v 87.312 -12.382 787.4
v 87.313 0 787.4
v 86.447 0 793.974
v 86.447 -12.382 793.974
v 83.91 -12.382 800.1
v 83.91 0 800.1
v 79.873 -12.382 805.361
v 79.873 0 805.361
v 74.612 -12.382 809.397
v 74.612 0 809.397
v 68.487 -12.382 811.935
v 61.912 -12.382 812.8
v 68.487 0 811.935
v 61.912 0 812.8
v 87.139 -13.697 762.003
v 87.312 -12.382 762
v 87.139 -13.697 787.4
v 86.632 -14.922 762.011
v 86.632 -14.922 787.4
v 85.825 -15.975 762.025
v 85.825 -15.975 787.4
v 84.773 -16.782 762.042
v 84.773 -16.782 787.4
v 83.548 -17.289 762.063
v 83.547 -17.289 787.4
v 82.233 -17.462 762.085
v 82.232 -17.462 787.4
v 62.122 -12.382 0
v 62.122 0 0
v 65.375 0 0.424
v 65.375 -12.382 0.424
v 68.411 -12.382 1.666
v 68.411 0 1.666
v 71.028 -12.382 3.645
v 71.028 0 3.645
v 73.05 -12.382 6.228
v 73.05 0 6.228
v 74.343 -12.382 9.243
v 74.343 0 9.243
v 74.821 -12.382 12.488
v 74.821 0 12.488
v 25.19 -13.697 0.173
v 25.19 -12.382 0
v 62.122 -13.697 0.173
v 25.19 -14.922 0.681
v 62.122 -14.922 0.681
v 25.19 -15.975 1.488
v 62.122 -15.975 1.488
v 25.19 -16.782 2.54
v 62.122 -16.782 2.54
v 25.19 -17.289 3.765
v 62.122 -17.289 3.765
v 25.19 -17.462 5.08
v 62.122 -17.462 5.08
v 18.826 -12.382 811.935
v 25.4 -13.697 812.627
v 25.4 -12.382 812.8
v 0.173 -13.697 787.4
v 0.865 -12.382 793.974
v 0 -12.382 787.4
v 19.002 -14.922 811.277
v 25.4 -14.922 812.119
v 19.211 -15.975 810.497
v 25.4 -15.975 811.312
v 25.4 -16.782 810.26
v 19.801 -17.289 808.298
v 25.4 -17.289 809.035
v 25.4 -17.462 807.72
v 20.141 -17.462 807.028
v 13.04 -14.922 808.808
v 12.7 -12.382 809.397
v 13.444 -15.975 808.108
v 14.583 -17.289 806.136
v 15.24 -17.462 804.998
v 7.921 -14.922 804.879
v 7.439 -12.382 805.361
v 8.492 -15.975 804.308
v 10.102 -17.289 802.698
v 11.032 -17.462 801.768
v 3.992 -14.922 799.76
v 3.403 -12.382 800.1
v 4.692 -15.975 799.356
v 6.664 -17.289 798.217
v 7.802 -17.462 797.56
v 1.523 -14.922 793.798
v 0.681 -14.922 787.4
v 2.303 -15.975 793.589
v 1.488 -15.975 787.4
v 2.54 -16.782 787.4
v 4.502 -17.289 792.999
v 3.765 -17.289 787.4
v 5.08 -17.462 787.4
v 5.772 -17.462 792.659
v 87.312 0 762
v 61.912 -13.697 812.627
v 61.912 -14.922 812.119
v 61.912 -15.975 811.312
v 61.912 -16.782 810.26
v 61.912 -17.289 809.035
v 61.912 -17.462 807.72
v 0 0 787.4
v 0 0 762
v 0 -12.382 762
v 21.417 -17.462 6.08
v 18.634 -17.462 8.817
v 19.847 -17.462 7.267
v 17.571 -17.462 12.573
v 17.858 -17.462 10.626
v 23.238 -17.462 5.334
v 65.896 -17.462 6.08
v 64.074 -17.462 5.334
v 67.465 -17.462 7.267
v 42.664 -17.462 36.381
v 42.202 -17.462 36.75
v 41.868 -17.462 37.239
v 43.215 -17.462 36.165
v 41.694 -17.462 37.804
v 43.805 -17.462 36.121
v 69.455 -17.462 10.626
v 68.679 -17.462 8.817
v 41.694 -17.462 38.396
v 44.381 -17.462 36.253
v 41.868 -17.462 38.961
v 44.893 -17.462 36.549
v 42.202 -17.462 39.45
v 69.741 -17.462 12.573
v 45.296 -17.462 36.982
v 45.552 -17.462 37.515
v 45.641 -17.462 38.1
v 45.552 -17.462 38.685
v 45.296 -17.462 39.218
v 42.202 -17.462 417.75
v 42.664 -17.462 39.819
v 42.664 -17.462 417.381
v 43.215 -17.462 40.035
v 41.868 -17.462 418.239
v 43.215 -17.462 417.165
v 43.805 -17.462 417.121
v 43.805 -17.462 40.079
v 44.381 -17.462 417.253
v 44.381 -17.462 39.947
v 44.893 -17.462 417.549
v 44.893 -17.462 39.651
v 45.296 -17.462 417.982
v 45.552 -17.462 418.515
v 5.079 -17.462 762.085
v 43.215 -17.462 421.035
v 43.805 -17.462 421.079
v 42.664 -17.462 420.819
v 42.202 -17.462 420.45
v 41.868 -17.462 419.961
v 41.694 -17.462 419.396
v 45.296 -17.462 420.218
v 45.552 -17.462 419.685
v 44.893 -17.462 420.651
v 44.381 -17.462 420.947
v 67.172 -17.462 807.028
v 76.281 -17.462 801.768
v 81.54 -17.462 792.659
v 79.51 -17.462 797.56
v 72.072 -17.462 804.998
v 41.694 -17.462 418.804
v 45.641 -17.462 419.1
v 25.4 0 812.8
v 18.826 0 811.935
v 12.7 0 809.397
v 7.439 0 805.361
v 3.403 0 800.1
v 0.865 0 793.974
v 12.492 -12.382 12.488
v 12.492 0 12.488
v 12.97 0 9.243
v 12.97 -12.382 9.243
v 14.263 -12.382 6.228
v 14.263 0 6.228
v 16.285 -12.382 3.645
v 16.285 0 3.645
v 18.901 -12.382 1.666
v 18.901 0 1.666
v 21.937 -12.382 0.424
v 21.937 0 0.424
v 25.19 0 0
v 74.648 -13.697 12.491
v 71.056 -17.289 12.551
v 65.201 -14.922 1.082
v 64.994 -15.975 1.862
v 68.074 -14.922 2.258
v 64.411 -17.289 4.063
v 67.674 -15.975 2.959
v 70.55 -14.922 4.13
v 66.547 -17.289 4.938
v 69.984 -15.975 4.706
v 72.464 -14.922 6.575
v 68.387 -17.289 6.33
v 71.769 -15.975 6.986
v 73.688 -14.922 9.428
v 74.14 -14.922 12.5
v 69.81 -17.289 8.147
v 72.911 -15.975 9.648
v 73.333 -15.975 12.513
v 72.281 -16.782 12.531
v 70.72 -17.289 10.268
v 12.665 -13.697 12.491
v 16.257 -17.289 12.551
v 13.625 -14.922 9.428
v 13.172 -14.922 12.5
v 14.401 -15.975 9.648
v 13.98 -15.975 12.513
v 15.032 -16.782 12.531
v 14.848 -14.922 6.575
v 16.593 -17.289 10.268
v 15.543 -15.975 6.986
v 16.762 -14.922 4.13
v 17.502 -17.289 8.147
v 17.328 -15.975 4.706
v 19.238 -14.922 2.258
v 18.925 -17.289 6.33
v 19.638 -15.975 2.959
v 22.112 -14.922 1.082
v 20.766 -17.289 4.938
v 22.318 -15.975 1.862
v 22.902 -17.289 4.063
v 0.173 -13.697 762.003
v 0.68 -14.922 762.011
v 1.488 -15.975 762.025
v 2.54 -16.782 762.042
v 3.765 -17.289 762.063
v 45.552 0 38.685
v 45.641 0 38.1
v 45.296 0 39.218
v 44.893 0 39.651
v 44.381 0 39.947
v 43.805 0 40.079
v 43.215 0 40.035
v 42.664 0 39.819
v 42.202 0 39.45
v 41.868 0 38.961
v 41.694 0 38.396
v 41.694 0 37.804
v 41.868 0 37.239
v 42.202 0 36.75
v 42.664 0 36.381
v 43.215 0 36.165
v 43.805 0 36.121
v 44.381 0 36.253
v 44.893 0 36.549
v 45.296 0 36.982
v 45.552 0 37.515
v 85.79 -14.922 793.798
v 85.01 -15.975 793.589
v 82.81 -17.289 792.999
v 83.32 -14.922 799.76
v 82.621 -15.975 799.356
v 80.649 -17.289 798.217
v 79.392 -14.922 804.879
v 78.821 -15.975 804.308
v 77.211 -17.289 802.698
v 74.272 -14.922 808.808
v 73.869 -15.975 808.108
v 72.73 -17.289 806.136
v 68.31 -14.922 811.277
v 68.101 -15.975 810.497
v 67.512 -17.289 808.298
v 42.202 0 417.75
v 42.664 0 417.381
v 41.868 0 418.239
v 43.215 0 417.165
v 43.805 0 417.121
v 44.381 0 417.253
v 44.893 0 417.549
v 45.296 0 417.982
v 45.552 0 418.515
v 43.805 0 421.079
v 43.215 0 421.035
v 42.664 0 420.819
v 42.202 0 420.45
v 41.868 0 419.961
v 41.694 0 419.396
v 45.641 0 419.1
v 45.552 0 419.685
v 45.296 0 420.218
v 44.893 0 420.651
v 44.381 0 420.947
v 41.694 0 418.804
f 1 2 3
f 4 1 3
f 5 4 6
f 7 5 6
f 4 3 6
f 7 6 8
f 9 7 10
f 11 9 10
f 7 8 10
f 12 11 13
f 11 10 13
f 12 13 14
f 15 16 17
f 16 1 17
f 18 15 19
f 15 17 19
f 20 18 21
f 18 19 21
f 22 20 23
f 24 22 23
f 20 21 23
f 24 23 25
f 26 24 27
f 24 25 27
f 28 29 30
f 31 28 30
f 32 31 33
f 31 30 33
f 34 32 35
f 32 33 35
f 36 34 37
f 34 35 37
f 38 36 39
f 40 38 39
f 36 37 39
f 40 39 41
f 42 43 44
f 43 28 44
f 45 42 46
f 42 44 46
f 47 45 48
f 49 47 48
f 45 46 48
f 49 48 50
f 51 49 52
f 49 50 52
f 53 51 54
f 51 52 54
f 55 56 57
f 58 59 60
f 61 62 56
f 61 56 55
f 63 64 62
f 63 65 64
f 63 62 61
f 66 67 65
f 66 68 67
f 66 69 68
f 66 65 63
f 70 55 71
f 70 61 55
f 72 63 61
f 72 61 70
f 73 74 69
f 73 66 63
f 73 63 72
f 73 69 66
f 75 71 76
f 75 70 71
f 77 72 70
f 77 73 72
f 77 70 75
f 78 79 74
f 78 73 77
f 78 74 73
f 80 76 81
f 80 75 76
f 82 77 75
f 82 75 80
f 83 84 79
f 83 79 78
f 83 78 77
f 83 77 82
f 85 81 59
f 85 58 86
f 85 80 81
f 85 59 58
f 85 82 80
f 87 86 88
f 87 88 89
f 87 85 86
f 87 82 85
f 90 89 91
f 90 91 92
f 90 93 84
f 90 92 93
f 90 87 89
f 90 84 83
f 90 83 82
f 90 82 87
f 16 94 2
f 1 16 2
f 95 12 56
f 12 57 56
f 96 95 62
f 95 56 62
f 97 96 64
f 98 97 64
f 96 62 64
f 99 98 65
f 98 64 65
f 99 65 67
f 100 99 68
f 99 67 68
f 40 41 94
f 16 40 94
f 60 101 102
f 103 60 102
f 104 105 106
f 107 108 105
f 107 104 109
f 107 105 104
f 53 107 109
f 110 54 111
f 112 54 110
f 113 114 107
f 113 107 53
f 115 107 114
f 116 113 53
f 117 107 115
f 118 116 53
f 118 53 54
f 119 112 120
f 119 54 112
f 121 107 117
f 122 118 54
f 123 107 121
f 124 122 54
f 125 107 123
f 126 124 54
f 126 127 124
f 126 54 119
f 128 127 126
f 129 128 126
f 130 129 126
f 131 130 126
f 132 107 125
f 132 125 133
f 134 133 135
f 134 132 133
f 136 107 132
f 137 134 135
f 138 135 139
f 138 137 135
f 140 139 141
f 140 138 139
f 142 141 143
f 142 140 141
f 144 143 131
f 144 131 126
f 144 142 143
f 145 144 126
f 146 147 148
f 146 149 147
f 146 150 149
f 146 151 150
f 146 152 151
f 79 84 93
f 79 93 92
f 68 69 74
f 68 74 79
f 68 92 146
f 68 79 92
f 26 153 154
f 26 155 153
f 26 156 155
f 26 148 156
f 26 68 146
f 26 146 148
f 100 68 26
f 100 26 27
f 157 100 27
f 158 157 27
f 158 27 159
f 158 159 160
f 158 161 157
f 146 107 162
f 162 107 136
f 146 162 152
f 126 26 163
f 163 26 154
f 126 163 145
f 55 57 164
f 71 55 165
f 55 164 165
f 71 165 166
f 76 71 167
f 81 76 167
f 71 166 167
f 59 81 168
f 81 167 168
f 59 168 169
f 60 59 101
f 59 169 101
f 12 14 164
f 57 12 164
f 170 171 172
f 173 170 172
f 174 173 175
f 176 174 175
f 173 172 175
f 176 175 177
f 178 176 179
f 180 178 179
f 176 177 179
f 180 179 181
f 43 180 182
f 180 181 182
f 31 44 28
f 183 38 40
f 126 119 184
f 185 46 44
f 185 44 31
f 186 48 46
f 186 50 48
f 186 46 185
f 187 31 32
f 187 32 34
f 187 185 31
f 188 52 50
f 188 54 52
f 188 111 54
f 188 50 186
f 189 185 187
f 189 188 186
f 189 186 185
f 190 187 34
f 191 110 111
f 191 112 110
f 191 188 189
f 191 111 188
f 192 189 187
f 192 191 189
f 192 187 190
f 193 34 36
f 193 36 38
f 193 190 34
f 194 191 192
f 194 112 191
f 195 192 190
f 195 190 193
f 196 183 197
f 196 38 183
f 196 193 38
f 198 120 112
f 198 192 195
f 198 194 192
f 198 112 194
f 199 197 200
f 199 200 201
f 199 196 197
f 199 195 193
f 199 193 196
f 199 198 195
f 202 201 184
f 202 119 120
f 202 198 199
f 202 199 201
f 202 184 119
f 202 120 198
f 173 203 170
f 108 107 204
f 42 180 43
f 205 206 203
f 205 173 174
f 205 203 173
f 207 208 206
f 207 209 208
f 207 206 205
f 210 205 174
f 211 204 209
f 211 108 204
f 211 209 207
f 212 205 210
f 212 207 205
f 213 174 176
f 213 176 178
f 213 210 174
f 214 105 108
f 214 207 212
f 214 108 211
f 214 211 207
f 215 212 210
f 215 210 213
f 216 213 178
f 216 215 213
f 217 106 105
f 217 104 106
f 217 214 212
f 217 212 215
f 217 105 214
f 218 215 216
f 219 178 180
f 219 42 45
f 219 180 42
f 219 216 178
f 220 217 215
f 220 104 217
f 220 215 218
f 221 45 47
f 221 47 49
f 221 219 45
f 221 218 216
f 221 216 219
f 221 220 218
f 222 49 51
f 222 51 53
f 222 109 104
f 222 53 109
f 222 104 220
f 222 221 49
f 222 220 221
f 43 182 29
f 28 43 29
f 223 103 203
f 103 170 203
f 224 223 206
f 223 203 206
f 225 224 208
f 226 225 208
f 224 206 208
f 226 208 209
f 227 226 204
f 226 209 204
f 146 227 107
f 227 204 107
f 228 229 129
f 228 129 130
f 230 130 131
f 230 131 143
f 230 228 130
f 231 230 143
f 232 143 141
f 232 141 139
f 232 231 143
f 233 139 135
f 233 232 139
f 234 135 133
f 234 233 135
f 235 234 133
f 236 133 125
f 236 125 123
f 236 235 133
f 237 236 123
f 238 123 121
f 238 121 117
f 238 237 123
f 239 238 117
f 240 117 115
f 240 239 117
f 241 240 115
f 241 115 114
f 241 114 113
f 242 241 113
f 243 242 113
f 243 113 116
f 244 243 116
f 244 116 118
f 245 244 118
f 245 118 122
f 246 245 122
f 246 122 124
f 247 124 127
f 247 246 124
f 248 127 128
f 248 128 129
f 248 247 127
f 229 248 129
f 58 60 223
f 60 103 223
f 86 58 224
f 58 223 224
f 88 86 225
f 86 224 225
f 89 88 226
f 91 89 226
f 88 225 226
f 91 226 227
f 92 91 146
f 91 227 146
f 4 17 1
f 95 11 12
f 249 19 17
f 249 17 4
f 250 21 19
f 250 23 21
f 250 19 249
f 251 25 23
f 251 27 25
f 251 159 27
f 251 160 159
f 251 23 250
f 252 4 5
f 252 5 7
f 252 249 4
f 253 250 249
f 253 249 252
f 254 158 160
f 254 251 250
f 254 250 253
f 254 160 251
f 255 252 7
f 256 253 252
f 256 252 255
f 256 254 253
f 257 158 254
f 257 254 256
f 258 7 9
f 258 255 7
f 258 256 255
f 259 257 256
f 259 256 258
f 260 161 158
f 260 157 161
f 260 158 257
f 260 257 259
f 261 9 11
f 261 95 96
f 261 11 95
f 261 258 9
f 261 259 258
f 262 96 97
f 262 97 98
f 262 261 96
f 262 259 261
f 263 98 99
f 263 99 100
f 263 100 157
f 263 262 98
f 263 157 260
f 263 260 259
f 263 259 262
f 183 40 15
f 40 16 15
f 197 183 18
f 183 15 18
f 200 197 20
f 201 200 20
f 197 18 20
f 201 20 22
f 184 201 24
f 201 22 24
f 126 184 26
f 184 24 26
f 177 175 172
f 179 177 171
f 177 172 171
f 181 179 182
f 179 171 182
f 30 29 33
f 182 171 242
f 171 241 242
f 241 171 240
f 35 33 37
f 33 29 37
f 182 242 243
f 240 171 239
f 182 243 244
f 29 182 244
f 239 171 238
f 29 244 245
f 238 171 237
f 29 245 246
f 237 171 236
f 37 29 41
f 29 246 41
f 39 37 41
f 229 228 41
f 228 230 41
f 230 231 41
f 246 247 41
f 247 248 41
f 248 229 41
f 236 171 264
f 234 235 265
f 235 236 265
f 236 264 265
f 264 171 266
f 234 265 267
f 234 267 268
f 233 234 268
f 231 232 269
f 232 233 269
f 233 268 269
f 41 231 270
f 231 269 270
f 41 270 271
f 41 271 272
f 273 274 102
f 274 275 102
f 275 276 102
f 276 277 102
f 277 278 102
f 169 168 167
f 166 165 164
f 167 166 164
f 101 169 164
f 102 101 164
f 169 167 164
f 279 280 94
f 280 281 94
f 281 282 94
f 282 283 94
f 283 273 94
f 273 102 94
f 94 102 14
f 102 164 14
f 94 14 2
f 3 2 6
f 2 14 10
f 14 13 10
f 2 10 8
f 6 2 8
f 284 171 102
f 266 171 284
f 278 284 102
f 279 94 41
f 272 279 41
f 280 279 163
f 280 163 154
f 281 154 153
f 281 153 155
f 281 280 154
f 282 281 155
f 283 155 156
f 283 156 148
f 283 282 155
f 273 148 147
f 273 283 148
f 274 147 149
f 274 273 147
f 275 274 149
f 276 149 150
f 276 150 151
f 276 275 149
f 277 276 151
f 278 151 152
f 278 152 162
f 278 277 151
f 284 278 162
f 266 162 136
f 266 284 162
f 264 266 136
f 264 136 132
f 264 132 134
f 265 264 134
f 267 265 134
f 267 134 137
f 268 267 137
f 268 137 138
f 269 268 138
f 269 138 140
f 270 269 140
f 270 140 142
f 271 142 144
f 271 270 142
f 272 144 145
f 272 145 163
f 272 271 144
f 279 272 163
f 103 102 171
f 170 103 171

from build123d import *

# Parameters (mm, degrees)
F0_R     = 1.984375
F1_DEPTH = 17.4625
F2_R     = 5.08


with BuildPart() as f1:
    # F0 (on Front) → F1 (new body)
    with BuildSketch(Plane.XZ):
        with BuildLine():
            Line((61.9125, 812.8), (25.4, 812.8))
            ThreePointArc((25.4, 812.8), (7.439488, 805.360512), (0, 787.4))
            Line((0, 787.4), (0, 762))
            Line((0, 762), (12.491861, 12.488363))
            ThreePointArc((12.491861, 12.488363), (16.28498, 3.645228), (25.190097, 0))
            Line((25.190097, 0), (62.122403, 0))
            ThreePointArc((62.122403, 0), (71.02752, 3.645228), (74.820639, 12.488363))
            Line((74.820639, 12.488363), (87.3125, 762))
            Line((87.3125, 762), (87.3125, 787.4))
            ThreePointArc((87.3125, 787.4), (79.873012, 805.360512), (61.9125, 812.8))
        make_face()
        with Locations((43.65625, 38.1)):
            Circle(F0_R, mode=Mode.SUBTRACT)
        with Locations((43.65625, 419.1)):
            Circle(F0_R, mode=Mode.SUBTRACT)
    extrude(amount=F1_DEPTH)

    # F2
    f2_edges = [f1.edges().sort_by_distance(p)[0] for p in [
        (6.24593, -17.4625, 387.244181),
        (7.439488, -17.4625, 805.360512),
    ]]
    fillet(f2_edges, radius=F2_R)


solid = f1.part
